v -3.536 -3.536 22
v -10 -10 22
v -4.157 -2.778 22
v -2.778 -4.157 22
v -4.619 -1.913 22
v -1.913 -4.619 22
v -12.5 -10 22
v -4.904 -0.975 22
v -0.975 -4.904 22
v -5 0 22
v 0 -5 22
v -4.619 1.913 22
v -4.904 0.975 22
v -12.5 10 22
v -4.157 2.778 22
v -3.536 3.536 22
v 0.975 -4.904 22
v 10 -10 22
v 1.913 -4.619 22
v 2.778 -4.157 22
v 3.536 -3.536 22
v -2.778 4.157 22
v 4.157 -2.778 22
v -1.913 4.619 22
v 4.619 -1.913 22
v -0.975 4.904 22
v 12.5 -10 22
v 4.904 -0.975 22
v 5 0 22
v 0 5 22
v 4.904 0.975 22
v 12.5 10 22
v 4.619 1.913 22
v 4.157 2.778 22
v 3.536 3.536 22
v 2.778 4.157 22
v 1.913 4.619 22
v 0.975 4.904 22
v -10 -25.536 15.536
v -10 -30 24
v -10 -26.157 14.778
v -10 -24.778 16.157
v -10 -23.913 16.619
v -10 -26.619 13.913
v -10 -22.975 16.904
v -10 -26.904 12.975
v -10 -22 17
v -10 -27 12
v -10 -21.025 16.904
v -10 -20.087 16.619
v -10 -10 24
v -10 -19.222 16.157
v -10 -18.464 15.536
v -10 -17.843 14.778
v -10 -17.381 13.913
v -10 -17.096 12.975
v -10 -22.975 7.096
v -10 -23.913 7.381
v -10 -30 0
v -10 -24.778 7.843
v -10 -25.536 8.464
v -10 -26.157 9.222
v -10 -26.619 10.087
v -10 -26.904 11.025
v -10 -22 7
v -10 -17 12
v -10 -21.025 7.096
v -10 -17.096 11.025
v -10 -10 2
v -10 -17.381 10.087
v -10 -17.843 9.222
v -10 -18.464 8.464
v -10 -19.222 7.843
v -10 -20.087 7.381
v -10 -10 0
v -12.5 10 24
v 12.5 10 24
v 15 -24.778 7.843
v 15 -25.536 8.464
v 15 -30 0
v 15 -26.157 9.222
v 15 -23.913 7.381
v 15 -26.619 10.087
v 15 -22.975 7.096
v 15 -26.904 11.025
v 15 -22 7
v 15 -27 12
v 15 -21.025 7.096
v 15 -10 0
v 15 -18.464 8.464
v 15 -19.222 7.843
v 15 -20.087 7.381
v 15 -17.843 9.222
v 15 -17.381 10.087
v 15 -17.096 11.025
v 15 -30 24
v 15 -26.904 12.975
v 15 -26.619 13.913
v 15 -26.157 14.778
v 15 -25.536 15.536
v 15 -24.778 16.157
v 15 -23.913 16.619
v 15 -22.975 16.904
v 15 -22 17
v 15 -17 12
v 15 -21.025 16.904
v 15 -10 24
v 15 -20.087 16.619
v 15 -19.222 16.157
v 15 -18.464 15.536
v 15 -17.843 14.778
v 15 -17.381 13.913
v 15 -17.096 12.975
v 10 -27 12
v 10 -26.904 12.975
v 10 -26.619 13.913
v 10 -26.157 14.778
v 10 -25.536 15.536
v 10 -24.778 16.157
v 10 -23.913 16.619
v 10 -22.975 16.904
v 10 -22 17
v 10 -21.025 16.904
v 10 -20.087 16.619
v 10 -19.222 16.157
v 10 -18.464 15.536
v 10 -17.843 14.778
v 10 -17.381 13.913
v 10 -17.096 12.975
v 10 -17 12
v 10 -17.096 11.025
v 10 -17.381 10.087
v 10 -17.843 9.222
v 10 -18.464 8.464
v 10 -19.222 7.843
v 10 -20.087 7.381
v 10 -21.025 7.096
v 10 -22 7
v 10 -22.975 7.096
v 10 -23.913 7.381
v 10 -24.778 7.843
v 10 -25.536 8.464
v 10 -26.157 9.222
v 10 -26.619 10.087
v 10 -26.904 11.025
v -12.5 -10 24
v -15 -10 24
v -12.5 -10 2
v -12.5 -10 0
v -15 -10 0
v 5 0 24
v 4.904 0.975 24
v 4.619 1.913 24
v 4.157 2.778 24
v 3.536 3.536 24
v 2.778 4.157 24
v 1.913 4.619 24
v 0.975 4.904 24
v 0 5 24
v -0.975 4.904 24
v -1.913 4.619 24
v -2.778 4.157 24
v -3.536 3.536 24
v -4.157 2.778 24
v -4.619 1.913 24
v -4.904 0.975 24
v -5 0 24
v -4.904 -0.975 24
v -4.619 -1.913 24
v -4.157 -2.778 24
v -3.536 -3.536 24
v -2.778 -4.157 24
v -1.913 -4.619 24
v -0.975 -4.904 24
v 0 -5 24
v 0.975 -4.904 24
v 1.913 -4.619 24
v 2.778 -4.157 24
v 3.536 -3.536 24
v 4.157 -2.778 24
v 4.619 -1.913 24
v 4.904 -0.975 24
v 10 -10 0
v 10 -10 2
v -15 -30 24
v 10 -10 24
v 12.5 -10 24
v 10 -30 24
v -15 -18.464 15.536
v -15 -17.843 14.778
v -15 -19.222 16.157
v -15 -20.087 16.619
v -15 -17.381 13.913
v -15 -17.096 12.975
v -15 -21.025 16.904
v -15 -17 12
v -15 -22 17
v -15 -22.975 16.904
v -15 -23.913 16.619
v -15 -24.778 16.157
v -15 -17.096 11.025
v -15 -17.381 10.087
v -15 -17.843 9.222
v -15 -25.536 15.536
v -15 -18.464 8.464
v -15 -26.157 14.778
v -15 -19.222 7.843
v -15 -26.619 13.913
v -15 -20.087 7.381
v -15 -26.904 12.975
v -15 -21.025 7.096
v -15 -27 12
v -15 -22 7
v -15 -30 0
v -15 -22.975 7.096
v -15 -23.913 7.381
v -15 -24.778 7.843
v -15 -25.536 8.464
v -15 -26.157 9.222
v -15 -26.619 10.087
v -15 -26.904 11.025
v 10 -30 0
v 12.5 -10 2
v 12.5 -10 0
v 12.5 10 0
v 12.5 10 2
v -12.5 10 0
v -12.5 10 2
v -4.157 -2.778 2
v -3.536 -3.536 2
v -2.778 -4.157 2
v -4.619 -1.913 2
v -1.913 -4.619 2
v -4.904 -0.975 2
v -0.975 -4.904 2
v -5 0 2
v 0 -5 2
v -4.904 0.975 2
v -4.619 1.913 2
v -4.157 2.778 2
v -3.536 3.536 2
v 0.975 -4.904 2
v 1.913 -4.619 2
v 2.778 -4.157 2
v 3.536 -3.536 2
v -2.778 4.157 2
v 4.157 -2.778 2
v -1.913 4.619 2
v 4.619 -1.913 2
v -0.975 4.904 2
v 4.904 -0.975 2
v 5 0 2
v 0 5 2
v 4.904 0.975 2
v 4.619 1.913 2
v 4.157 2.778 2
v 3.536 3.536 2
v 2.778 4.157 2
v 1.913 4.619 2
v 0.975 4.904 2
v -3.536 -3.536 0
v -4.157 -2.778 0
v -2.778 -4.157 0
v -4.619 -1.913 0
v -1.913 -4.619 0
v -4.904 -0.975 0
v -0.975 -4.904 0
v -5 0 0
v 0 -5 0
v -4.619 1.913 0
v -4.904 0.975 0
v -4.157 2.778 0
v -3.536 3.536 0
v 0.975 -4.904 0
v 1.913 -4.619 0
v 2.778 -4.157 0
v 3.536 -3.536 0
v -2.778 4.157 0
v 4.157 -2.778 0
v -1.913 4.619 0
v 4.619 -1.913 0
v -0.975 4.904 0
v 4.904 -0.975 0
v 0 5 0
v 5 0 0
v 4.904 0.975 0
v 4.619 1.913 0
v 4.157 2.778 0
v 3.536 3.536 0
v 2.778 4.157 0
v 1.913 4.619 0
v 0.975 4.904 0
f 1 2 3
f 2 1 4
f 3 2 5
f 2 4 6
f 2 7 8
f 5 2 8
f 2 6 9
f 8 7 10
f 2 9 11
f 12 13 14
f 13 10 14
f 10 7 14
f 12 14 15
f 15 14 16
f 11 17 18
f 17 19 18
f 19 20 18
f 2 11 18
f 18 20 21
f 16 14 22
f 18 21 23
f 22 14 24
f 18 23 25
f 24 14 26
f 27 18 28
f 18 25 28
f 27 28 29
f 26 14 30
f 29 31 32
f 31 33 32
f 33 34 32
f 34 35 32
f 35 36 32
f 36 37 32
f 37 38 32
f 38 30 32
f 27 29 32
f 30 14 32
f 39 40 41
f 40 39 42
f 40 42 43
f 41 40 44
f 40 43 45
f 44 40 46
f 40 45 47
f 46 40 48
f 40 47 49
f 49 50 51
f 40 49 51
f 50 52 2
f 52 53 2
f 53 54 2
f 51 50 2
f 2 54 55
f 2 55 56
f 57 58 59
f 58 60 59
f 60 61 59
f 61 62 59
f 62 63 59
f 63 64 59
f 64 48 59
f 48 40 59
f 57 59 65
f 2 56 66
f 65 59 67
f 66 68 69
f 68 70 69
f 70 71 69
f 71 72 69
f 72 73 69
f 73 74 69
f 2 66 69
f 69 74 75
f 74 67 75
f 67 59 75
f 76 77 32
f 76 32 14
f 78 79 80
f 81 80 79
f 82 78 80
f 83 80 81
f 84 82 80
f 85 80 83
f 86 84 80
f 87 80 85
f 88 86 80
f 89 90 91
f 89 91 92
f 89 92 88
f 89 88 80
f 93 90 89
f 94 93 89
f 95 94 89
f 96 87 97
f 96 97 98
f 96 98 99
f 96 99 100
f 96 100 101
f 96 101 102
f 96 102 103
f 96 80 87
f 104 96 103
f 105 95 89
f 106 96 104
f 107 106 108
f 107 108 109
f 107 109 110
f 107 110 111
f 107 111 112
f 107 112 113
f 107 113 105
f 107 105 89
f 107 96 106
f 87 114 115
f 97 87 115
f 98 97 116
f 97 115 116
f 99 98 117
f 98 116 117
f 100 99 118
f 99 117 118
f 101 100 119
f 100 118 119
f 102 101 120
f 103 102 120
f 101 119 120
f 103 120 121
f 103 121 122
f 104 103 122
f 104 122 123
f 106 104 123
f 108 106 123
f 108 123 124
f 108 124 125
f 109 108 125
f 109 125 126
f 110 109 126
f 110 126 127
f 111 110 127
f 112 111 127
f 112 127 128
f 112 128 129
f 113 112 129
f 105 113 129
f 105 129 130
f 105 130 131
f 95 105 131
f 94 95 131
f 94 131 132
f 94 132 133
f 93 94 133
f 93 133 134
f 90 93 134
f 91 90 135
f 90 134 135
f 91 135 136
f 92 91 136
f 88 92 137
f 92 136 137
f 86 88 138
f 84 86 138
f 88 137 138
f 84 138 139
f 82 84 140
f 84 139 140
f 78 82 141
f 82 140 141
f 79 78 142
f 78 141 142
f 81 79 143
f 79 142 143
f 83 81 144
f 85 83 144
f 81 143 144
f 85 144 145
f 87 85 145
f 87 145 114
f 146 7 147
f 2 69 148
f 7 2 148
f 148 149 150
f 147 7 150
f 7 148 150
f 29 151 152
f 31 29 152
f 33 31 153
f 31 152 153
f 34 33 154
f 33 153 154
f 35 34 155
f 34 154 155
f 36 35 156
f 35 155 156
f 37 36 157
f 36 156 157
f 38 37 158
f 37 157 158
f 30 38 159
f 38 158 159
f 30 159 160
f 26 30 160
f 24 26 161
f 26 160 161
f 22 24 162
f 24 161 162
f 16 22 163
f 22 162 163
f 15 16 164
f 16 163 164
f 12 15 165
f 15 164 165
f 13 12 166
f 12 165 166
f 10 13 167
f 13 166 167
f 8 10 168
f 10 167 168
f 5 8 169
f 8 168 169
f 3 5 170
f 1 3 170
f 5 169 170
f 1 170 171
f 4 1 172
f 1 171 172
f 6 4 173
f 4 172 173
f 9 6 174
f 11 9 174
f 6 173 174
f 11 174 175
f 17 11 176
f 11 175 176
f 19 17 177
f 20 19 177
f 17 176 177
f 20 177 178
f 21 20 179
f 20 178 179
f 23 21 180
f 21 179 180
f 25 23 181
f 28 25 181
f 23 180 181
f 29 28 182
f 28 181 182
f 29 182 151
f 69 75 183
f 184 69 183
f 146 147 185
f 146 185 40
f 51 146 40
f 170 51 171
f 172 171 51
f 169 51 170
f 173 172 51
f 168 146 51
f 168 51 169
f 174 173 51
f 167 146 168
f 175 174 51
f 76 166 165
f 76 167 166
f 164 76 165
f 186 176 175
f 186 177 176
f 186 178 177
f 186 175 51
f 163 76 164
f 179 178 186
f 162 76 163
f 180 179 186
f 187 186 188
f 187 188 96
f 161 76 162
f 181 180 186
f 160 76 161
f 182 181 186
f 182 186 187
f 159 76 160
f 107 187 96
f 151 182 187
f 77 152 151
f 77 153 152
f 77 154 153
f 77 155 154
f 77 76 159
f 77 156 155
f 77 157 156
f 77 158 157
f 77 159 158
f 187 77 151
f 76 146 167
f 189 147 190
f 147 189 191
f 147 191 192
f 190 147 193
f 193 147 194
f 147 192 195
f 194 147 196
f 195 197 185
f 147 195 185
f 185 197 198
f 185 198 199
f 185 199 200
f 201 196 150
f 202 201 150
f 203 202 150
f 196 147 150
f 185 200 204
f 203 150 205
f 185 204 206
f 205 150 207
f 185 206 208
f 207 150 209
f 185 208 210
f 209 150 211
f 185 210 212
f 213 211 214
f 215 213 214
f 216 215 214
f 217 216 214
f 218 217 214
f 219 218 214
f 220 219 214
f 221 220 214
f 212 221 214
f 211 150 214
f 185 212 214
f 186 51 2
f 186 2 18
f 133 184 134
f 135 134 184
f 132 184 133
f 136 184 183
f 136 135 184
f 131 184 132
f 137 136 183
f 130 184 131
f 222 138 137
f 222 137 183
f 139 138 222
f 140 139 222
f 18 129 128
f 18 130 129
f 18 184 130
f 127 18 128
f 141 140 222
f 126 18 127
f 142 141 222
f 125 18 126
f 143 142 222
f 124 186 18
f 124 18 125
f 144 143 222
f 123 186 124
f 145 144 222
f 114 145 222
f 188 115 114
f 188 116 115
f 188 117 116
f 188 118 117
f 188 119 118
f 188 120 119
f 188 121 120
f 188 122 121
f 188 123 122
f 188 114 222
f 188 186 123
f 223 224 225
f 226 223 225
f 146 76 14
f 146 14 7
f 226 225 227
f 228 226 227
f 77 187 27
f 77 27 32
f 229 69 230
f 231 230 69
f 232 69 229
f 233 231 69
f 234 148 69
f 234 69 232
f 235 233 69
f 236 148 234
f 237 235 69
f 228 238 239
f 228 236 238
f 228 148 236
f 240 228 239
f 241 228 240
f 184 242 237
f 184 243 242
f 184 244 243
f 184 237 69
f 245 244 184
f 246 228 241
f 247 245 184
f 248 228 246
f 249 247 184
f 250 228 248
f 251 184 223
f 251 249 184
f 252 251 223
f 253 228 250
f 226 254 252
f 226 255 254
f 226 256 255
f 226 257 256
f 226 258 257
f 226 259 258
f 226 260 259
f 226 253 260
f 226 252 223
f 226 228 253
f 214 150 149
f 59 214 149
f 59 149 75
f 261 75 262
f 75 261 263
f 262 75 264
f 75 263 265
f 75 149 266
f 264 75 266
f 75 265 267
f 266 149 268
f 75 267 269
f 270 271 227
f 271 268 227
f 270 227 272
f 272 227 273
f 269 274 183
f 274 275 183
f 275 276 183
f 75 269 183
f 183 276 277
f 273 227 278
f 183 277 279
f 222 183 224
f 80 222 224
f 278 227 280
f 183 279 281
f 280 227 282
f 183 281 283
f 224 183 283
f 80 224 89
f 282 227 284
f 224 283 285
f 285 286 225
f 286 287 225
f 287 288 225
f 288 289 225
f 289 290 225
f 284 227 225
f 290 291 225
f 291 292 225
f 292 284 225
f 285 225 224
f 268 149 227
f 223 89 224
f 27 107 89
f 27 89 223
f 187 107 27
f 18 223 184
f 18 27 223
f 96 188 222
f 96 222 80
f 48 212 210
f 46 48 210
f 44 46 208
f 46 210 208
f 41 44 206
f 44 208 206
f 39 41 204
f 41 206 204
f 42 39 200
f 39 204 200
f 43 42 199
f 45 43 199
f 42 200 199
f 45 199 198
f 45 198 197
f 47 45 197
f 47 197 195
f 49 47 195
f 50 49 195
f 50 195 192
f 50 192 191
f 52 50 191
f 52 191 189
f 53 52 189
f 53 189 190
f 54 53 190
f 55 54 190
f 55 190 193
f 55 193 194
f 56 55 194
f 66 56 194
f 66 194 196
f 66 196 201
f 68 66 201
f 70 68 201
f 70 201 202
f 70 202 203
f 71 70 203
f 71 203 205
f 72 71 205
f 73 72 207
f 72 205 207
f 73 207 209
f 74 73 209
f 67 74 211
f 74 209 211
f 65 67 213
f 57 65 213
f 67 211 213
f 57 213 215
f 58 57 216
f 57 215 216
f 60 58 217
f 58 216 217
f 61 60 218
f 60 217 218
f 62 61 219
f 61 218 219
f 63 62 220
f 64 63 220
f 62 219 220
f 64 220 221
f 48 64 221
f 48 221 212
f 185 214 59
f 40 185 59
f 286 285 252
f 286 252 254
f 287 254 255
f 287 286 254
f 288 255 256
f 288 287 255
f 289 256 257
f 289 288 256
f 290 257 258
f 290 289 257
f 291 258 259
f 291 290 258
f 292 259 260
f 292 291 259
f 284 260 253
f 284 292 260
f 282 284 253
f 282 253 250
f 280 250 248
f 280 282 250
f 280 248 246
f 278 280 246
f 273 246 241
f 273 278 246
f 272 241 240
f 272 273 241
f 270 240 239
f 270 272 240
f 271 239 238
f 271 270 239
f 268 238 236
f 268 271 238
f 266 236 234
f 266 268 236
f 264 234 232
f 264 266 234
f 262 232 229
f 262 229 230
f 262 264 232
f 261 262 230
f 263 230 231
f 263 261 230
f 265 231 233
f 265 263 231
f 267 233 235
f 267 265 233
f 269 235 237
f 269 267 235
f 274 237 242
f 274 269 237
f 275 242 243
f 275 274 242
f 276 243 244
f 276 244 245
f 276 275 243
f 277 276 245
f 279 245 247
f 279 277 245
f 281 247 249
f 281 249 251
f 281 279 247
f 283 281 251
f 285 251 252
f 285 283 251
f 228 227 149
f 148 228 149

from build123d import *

# Parameters (mm, degrees)
SKETCH1_R           = 5
BOSS_EXTRUDE1_DEPTH = 2
BOSS_EXTRUDE2_DEPTH = 12
SKETCH2_R           = 5
CUT_EXTRUDE1_DEPTH  = 48


with BuildPart() as part:
    # Sketch1 → Boss-Extrude1 (new body)
    with BuildSketch(Plane.XY):
        Polygon((-10, -10), (10, -10), (12.5, -10), (12.5, 10), (-12.5, 10), (-12.5, -10), align=None)
        Circle(SKETCH1_R, mode=Mode.SUBTRACT)
    boss_extrude1 = extrude(amount=BOSS_EXTRUDE1_DEPTH)

    # Sketch1<3> → Boss-Extrude2 (add)
    with BuildSketch(Plane.XY):
        Polygon((10, -10), (10, -30), (15, -30), (15, -10), (12.5, -10), align=None)
        Polygon((-10, -30), (-10, -10), (-12.5, -10), (-15, -10), (-15, -30), align=None)
    boss_extrude2 = extrude(amount=BOSS_EXTRUDE2_DEPTH)

    # Mirror1: Boss-Extrude2 across plane
    add(boss_extrude2.mirror(Plane.XY.offset(12)))

    # Mirror2: Boss-Extrude1 across plane
    add(boss_extrude1.mirror(Plane.XY.offset(12)))

    # Sketch2 → Cut-Extrude1 (cut)
    with BuildSketch(Plane.ZY.offset(15)):
        with Locations(Location((12, -22, 0), (0, 0, 270))):
            Circle(SKETCH2_R)
    extrude(amount=-CUT_EXTRUDE1_DEPTH, mode=Mode.SUBTRACT)


solid = part.part
